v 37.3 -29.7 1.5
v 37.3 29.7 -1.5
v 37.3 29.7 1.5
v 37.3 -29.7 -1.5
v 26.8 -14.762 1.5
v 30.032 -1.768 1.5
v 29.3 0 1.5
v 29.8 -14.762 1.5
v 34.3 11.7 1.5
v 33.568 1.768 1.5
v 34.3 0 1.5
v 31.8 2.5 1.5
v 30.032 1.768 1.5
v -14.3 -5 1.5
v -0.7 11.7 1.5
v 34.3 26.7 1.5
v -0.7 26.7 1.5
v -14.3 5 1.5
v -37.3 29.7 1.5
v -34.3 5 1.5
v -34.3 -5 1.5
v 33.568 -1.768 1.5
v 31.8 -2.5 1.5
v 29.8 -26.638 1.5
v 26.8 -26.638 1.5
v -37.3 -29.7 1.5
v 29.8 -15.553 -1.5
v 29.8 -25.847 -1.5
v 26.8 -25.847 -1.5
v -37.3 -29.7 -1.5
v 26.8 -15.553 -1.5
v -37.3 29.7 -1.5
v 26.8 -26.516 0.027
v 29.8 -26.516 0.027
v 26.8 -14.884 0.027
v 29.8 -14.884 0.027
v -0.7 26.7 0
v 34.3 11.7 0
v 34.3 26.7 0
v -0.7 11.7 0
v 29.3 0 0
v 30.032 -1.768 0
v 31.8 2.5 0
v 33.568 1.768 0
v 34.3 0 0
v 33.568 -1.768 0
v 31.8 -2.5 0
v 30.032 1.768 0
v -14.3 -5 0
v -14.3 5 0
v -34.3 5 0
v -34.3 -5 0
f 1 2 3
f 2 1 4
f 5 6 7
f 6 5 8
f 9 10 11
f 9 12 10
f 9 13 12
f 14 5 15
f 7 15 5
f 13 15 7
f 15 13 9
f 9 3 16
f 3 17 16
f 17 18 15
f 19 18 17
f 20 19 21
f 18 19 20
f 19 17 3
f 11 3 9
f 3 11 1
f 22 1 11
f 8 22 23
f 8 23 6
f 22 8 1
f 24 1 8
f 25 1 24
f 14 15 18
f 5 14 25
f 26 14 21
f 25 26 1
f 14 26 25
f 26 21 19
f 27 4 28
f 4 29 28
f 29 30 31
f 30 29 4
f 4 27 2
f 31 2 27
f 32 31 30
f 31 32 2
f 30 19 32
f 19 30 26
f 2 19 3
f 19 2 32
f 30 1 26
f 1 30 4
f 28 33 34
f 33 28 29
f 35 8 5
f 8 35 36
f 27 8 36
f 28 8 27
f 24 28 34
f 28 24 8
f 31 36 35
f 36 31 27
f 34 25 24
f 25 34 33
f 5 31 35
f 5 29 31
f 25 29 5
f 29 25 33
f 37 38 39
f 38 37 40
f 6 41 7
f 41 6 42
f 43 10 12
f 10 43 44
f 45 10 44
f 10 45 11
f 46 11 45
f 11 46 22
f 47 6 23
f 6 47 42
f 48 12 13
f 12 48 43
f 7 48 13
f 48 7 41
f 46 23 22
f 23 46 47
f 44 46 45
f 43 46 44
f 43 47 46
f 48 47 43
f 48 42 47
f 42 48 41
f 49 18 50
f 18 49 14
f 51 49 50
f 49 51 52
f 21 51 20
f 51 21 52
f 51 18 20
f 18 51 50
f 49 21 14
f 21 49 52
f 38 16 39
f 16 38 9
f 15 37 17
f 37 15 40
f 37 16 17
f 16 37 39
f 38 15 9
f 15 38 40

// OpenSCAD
// Create the enclosure
difference(){
    cube([68.6 + 2*3, 53.4 + 2*3, 3], center = true);

// Cut out the USB port
  translate([68.6/2 - 12/2, -53.4/2 + 12/2, 3/2])
    rotate([0,90,0])cylinder(h = 3, r = 12/2, center = true);

// Cut out the DC power jack
  translate([68.6/2 - 10/2, 53.4/2 - 10/2, 3/2]) 
    cylinder(h = 3, r = 10/2, center = true);

// Cut out the reset button
    translate([68.6/2 - 5/2, 0, 3/2])
    cylinder(h = 3, r = 5/2, center = true);

// Cut out the headers

  translate([-68.6/2 + 20/2, 0, 3/2])
    cube([20, 10, 3], center = true);
// Cut out the display

  translate([68.6/2 - 35/2, 53.4/2 - 15/2, 3/2])
    cube([35, 15, 3], center = true);
}
// Render the enclosure
render();
